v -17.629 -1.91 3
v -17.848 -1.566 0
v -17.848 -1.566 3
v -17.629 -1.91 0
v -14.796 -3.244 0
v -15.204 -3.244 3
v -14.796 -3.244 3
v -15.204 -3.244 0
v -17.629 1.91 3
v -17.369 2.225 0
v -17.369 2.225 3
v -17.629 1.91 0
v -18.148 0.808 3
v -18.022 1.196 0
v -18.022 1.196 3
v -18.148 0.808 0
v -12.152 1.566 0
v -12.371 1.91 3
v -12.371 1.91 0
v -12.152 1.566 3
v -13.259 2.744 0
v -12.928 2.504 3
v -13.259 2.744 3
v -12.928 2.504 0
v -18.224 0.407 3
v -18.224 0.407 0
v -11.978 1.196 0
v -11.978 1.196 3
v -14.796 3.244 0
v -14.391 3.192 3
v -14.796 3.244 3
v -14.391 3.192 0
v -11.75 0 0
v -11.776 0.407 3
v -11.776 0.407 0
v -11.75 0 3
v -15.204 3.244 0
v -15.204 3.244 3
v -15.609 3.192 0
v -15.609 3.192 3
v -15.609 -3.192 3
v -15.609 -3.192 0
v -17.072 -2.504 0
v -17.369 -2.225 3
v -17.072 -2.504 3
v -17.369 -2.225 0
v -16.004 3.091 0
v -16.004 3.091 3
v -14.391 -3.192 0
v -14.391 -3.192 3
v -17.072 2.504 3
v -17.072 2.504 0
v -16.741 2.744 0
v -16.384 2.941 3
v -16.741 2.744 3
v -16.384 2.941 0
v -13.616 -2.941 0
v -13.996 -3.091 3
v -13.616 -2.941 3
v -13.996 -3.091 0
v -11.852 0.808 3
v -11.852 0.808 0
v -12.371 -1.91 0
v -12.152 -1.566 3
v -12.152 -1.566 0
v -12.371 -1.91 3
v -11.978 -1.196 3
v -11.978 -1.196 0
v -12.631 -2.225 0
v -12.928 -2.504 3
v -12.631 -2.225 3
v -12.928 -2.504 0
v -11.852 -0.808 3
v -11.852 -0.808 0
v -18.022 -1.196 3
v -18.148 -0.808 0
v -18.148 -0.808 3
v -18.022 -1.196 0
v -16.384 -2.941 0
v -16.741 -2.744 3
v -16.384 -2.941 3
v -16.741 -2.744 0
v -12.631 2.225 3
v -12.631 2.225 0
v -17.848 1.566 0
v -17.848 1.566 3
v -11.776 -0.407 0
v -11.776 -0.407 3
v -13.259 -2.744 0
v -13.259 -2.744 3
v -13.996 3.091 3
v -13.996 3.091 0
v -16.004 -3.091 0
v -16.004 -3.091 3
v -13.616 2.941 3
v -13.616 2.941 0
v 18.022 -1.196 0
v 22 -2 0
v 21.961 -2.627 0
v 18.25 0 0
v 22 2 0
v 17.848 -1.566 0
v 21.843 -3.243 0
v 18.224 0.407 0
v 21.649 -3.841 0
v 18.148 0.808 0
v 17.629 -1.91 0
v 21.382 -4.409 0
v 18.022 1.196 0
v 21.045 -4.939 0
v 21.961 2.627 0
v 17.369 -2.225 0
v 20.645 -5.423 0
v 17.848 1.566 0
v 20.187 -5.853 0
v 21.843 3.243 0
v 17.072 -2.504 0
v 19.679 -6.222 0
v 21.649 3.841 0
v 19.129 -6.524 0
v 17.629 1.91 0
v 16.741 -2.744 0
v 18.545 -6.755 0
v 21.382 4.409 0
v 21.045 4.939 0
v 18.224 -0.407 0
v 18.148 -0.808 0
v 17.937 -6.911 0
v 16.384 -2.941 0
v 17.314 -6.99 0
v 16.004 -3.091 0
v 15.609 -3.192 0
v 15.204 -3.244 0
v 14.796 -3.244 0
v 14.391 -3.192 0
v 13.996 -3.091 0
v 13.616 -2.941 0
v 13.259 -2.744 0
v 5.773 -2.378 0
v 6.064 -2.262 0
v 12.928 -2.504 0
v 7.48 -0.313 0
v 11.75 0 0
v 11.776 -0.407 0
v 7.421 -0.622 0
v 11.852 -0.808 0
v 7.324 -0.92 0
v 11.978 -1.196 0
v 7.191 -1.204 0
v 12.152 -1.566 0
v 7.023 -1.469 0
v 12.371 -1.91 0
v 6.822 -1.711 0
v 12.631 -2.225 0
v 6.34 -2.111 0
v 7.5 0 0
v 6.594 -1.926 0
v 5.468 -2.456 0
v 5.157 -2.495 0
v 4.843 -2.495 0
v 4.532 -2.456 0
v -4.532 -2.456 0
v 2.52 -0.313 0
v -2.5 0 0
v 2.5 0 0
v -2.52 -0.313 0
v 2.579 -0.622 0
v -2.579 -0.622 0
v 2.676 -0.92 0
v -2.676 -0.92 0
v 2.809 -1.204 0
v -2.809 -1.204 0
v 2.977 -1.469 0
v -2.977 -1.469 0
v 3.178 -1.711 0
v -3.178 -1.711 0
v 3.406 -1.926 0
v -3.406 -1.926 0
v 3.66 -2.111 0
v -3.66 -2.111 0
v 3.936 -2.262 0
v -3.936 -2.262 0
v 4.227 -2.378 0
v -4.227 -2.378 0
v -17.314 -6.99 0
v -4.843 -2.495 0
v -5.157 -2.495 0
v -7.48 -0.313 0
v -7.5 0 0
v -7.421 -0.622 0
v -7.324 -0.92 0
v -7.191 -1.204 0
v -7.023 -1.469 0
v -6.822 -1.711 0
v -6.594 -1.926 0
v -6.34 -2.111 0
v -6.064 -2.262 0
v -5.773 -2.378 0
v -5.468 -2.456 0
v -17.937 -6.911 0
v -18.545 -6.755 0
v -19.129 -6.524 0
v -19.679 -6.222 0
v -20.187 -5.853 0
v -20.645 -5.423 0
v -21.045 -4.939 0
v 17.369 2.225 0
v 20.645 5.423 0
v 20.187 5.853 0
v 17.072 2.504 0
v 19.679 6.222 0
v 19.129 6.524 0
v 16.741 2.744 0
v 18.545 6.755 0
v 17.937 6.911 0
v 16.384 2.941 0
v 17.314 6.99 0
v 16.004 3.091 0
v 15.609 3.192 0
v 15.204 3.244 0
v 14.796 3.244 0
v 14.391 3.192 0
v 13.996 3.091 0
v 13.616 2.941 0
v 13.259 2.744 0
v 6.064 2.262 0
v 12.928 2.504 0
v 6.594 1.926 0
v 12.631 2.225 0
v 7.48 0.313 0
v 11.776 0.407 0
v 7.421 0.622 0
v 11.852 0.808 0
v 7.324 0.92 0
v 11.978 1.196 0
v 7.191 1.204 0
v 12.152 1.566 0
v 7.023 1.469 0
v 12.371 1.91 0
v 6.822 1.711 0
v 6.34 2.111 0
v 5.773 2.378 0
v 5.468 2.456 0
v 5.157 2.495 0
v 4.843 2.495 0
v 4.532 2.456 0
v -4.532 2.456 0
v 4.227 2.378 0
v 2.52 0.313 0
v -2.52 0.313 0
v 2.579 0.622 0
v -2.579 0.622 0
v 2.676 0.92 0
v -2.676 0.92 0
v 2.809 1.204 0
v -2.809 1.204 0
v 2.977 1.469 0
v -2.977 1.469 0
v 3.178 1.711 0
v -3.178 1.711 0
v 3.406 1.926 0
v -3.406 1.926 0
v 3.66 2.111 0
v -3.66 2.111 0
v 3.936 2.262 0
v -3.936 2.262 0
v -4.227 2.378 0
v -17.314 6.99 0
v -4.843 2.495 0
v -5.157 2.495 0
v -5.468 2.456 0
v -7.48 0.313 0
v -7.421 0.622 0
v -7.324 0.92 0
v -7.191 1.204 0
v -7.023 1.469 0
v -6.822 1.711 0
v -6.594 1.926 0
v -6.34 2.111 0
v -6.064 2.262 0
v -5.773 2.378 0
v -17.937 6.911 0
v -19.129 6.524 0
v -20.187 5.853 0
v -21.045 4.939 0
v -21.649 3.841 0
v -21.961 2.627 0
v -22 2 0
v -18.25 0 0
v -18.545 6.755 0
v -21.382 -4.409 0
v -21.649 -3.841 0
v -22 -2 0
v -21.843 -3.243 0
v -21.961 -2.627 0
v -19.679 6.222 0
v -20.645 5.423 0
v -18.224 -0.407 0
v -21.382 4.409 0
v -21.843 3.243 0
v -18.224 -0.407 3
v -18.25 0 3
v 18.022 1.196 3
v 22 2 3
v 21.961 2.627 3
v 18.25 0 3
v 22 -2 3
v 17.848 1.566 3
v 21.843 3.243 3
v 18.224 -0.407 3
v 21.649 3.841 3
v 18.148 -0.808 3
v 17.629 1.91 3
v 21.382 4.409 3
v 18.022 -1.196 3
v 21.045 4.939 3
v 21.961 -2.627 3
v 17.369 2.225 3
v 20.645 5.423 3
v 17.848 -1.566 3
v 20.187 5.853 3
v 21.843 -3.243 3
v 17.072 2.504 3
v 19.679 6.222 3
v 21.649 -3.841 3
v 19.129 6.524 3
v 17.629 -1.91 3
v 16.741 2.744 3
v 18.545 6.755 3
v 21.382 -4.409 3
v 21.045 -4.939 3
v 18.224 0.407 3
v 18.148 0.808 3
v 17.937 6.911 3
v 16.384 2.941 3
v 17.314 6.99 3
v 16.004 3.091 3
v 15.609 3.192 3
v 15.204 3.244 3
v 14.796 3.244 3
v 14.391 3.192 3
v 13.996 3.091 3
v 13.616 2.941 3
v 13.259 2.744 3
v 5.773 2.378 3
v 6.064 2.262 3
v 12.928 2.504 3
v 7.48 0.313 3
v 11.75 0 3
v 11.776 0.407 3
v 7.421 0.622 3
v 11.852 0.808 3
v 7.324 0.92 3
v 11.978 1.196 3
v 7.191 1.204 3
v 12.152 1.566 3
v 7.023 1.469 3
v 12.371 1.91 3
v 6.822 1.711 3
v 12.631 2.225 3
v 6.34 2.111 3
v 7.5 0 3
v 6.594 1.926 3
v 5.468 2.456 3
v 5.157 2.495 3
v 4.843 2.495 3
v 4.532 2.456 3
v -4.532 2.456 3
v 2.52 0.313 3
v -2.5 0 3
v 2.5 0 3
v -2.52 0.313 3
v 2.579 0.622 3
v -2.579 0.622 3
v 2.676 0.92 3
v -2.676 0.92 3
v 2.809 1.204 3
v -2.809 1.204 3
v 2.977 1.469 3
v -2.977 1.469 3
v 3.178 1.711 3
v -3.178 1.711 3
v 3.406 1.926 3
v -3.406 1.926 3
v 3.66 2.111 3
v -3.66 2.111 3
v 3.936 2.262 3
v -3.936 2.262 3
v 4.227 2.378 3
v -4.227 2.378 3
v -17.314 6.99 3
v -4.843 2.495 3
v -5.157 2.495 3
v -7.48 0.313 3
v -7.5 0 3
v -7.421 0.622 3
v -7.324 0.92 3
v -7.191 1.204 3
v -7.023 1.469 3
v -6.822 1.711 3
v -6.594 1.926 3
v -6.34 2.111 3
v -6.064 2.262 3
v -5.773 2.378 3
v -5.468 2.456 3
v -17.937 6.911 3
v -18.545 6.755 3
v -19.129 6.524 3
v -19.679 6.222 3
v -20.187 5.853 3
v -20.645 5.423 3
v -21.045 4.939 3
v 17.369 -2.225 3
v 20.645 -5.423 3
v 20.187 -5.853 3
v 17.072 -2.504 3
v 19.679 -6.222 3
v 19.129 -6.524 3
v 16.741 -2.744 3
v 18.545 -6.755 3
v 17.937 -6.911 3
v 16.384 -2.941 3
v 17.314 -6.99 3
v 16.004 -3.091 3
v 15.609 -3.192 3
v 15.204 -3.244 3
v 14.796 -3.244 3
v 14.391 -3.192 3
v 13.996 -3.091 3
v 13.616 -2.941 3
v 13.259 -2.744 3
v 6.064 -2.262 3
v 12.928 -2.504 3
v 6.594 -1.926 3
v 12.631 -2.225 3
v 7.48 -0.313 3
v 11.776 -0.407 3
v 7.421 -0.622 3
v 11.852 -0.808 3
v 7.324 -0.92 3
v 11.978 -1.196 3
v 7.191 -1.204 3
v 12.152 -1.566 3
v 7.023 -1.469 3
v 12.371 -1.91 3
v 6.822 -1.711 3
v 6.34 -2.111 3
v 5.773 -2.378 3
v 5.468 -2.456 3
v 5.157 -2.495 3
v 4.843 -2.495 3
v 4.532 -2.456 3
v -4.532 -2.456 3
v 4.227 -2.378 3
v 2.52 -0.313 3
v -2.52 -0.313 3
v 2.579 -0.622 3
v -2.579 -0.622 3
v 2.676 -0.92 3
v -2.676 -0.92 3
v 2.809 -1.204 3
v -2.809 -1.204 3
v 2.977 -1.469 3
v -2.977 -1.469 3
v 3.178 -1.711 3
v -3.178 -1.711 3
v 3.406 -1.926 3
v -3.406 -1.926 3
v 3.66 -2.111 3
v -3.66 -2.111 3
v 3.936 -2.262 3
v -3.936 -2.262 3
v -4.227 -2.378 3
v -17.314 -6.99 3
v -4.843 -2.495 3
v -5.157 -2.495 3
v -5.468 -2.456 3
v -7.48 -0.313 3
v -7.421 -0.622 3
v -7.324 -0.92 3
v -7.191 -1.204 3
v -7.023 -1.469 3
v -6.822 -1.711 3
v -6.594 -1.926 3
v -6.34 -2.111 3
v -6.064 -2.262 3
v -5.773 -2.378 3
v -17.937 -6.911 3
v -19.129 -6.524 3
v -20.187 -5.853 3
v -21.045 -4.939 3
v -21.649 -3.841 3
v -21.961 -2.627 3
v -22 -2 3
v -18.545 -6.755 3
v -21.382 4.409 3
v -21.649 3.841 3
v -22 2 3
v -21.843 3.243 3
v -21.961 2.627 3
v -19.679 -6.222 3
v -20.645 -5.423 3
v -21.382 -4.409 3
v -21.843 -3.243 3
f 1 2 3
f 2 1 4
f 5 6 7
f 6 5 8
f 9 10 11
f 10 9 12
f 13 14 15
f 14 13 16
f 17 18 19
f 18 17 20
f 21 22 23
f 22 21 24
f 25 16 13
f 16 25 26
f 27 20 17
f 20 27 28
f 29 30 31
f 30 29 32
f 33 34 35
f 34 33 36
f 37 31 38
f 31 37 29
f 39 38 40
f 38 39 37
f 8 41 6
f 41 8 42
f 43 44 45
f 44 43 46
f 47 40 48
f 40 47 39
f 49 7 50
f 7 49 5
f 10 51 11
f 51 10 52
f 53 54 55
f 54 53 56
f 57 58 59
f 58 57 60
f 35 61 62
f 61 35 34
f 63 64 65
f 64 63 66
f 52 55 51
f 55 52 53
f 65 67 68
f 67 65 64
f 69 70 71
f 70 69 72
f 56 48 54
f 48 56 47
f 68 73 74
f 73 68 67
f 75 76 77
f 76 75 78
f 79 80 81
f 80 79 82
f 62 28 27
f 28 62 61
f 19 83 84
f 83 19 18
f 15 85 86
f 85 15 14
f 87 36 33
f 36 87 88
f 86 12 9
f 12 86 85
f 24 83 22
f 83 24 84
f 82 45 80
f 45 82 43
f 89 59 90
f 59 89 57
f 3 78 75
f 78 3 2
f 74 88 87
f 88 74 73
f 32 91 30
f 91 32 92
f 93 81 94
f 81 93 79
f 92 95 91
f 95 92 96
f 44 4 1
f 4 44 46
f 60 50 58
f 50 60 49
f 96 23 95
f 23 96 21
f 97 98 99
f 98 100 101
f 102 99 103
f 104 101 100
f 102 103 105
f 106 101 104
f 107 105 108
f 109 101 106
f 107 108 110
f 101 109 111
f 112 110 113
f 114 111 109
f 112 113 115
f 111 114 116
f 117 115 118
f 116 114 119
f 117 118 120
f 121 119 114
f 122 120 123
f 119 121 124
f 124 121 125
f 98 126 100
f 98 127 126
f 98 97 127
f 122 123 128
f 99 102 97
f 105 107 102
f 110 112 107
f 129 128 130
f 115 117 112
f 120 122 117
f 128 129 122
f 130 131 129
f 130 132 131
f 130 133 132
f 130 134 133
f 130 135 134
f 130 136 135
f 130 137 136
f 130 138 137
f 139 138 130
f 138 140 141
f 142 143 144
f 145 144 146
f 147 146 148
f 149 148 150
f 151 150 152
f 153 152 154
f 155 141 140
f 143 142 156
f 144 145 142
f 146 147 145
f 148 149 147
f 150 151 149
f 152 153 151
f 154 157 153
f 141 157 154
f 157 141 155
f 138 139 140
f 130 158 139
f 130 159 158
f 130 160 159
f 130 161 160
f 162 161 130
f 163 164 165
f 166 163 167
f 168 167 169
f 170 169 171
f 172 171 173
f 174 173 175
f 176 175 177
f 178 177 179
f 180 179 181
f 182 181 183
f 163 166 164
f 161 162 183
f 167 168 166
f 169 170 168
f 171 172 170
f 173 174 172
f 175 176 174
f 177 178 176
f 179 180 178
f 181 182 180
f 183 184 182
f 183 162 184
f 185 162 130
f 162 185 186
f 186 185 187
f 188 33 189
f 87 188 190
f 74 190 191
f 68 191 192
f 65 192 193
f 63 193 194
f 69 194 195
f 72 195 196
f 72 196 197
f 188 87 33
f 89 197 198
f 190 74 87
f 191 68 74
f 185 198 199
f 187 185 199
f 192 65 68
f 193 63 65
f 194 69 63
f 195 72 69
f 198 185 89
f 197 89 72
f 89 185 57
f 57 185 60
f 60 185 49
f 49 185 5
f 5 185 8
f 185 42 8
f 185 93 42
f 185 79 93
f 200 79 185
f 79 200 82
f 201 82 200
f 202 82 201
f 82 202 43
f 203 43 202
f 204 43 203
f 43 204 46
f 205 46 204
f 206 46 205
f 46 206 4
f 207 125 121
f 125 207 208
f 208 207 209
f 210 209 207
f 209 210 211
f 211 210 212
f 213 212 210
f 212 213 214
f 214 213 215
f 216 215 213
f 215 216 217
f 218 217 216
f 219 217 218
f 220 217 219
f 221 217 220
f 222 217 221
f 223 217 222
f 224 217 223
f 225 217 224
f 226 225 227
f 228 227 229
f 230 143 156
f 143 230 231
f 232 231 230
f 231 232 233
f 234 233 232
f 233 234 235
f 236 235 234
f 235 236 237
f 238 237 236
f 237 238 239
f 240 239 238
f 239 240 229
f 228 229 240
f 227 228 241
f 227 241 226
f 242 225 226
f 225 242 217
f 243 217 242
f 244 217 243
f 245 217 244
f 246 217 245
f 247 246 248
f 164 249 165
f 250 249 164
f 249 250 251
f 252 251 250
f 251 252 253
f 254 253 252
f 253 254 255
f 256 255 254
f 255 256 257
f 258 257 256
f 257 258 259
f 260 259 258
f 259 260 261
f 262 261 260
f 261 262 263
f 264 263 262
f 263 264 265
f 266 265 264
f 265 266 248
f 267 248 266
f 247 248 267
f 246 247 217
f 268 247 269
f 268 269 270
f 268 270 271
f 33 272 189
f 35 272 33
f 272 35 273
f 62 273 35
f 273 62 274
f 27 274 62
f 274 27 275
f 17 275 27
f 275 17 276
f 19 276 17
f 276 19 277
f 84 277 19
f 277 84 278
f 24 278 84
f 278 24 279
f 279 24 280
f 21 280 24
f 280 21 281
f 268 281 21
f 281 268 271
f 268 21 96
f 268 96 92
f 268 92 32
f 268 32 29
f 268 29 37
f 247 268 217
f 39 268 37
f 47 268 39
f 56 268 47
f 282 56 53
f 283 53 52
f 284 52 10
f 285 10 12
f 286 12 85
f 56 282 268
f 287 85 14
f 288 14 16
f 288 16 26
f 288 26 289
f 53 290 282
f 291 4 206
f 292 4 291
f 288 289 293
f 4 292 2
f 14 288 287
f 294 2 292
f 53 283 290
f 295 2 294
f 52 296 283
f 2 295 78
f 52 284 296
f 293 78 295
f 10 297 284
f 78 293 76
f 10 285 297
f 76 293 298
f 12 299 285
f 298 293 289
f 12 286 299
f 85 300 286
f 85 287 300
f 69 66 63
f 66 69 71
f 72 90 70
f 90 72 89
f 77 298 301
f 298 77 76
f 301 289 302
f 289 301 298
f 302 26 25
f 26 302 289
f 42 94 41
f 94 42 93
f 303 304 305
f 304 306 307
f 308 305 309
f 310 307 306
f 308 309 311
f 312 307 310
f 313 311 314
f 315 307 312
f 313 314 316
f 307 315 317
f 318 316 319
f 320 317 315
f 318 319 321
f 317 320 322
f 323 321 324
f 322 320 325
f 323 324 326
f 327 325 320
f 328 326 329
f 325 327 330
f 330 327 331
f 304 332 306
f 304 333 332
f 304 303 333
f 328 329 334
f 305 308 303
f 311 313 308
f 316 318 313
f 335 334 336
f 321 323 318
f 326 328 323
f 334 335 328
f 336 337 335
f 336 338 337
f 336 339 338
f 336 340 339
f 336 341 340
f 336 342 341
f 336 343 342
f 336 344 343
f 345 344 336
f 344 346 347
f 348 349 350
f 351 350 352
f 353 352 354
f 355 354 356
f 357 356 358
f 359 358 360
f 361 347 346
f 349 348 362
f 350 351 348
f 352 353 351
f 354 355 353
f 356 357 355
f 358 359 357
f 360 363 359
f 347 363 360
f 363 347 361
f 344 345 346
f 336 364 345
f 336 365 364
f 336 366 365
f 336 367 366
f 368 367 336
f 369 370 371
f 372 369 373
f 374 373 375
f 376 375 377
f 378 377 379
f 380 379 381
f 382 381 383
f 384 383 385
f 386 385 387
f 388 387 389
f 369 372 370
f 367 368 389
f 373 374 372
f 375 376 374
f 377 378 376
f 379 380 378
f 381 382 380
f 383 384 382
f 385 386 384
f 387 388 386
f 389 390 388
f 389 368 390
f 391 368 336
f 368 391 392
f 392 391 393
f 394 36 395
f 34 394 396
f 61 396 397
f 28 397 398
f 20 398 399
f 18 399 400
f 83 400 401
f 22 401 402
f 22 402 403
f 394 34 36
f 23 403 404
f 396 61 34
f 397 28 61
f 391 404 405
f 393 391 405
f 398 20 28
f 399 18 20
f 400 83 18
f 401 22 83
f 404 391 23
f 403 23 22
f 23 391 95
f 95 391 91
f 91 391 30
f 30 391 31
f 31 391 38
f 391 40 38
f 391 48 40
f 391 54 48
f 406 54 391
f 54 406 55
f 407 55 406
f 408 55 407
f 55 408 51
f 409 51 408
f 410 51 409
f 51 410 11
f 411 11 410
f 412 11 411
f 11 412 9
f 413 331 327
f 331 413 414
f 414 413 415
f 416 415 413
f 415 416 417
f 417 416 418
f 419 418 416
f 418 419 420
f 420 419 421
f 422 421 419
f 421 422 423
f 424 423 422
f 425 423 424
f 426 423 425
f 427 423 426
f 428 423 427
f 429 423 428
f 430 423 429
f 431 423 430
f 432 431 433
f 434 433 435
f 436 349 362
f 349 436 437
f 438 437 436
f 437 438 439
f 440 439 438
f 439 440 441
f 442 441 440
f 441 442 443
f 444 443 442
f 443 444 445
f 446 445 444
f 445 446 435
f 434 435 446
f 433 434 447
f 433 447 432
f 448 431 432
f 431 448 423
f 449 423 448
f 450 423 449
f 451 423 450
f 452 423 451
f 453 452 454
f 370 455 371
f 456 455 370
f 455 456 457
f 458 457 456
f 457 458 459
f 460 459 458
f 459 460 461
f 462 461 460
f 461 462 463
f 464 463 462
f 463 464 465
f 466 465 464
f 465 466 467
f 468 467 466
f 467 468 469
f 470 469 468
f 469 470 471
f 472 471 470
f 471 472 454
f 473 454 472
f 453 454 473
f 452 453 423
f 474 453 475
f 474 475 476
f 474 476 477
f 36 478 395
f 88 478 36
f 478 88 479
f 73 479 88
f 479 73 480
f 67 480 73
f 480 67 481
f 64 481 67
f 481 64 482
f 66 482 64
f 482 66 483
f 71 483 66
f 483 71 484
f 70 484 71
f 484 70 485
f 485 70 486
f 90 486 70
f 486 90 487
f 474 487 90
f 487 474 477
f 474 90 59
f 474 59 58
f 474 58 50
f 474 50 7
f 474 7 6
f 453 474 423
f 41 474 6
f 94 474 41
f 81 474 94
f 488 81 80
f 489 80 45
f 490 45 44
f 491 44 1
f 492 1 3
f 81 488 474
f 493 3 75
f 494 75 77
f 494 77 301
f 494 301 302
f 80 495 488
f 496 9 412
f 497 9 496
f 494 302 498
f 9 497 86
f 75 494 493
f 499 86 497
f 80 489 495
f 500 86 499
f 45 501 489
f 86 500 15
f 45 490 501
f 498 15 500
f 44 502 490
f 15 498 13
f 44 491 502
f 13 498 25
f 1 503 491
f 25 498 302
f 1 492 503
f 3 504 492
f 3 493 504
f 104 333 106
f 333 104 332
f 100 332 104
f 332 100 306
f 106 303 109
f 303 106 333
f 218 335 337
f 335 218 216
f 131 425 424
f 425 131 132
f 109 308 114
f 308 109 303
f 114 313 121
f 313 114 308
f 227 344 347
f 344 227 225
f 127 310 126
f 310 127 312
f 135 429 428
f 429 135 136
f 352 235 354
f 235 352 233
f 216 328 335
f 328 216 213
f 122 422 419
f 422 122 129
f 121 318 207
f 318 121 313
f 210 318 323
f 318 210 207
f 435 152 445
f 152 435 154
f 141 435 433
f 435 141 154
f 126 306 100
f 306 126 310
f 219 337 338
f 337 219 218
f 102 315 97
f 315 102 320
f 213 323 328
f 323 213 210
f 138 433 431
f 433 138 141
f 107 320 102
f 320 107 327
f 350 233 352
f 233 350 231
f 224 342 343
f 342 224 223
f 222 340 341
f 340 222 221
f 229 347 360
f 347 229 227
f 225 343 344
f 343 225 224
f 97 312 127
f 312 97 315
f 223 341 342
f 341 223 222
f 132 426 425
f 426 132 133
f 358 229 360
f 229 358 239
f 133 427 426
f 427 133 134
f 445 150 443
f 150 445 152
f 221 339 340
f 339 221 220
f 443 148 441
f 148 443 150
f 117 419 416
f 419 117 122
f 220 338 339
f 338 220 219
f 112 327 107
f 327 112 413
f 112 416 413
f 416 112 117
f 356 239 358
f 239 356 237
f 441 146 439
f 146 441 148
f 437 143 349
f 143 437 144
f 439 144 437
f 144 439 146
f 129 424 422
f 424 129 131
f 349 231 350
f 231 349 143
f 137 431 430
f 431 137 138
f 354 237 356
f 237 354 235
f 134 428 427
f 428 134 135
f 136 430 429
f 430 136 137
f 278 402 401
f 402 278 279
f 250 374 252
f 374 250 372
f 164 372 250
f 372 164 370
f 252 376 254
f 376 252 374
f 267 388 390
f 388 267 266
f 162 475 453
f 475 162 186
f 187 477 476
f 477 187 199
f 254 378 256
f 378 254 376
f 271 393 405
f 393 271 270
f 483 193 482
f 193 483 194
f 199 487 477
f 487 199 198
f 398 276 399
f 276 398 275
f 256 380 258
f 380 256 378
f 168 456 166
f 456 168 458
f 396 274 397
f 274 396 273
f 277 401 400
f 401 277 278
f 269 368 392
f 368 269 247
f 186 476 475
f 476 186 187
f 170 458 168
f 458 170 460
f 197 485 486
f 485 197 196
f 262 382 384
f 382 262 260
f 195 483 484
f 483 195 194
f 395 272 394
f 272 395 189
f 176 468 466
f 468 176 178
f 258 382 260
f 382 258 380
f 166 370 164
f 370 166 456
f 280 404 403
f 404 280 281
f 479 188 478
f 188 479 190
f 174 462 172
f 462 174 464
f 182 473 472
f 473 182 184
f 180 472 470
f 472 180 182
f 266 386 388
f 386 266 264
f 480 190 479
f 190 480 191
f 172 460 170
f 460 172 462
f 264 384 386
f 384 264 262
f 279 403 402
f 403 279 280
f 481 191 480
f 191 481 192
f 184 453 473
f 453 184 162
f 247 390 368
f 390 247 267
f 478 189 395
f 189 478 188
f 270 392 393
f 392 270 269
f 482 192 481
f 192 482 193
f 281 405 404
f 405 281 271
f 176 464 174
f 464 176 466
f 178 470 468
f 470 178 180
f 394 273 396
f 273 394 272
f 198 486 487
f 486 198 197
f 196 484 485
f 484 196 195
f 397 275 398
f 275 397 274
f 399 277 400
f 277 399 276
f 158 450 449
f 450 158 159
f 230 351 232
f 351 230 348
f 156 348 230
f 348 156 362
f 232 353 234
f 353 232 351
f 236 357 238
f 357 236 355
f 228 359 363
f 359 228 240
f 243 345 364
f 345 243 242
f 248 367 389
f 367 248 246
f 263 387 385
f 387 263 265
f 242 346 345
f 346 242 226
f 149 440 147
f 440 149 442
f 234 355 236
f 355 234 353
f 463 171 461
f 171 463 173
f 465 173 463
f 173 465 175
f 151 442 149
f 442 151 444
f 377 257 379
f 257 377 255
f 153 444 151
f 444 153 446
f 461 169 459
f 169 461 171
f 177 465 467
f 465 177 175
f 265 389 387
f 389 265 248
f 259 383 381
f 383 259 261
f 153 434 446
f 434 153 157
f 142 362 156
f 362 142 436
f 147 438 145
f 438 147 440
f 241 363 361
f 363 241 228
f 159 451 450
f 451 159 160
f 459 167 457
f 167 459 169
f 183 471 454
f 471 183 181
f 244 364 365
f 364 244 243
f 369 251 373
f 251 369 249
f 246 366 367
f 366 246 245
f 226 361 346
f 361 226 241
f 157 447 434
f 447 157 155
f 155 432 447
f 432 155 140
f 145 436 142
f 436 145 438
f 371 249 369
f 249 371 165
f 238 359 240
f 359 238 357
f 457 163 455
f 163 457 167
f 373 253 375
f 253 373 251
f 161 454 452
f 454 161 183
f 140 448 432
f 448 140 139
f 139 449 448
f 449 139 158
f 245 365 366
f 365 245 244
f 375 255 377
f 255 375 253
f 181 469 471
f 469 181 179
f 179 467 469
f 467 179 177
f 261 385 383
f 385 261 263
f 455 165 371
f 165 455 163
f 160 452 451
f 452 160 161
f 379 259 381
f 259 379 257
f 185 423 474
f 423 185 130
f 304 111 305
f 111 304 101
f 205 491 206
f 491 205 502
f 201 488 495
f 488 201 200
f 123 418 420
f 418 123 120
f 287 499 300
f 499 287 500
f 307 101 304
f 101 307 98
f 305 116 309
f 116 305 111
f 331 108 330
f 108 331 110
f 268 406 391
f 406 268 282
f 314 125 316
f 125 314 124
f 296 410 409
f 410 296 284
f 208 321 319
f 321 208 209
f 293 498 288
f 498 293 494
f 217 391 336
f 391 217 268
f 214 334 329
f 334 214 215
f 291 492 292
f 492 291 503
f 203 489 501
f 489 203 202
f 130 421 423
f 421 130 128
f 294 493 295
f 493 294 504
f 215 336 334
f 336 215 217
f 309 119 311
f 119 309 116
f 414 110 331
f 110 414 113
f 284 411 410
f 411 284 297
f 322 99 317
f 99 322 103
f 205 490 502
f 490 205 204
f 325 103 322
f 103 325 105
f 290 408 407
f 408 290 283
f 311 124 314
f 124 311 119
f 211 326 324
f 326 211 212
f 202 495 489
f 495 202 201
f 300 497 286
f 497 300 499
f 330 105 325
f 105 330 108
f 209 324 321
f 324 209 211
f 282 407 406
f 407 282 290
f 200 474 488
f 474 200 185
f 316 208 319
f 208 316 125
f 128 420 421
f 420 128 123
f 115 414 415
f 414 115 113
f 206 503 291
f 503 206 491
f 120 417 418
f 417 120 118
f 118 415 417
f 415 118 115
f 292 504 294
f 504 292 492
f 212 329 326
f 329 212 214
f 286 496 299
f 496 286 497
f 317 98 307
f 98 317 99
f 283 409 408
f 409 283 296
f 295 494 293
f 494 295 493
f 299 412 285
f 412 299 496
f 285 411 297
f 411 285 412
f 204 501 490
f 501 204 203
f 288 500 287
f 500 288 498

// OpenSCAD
$fn = 50;

difference() {
	union() {
		hull() {
			translate(v = [-17.0, 2.0, 0]) {
				cylinder(h = 3, r = 5);
			}
			translate(v = [17.0, 2.0, 0]) {
				cylinder(h = 3, r = 5);
			}
			translate(v = [-17.0, -2.0, 0]) {
				cylinder(h = 3, r = 5);
			}
			translate(v = [17.0, -2.0, 0]) {
				cylinder(h = 3, r = 5);
			}
		}
	}
	union() {
		translate(v = [-15.0, 0.0, 0]) {
			cylinder(h = 3, r = 3.25);
		}
		translate(v = [15.0, 0.0, 0]) {
			cylinder(h = 3, r = 3.25);
		}
		translate(v = [-5.0, 0, 0.0]) {
			cylinder(h = 3, r = 2.5);
		}
		translate(v = [5.0, 0, 0.0]) {
			cylinder(h = 3, r = 2.5);
		}
	}
}
